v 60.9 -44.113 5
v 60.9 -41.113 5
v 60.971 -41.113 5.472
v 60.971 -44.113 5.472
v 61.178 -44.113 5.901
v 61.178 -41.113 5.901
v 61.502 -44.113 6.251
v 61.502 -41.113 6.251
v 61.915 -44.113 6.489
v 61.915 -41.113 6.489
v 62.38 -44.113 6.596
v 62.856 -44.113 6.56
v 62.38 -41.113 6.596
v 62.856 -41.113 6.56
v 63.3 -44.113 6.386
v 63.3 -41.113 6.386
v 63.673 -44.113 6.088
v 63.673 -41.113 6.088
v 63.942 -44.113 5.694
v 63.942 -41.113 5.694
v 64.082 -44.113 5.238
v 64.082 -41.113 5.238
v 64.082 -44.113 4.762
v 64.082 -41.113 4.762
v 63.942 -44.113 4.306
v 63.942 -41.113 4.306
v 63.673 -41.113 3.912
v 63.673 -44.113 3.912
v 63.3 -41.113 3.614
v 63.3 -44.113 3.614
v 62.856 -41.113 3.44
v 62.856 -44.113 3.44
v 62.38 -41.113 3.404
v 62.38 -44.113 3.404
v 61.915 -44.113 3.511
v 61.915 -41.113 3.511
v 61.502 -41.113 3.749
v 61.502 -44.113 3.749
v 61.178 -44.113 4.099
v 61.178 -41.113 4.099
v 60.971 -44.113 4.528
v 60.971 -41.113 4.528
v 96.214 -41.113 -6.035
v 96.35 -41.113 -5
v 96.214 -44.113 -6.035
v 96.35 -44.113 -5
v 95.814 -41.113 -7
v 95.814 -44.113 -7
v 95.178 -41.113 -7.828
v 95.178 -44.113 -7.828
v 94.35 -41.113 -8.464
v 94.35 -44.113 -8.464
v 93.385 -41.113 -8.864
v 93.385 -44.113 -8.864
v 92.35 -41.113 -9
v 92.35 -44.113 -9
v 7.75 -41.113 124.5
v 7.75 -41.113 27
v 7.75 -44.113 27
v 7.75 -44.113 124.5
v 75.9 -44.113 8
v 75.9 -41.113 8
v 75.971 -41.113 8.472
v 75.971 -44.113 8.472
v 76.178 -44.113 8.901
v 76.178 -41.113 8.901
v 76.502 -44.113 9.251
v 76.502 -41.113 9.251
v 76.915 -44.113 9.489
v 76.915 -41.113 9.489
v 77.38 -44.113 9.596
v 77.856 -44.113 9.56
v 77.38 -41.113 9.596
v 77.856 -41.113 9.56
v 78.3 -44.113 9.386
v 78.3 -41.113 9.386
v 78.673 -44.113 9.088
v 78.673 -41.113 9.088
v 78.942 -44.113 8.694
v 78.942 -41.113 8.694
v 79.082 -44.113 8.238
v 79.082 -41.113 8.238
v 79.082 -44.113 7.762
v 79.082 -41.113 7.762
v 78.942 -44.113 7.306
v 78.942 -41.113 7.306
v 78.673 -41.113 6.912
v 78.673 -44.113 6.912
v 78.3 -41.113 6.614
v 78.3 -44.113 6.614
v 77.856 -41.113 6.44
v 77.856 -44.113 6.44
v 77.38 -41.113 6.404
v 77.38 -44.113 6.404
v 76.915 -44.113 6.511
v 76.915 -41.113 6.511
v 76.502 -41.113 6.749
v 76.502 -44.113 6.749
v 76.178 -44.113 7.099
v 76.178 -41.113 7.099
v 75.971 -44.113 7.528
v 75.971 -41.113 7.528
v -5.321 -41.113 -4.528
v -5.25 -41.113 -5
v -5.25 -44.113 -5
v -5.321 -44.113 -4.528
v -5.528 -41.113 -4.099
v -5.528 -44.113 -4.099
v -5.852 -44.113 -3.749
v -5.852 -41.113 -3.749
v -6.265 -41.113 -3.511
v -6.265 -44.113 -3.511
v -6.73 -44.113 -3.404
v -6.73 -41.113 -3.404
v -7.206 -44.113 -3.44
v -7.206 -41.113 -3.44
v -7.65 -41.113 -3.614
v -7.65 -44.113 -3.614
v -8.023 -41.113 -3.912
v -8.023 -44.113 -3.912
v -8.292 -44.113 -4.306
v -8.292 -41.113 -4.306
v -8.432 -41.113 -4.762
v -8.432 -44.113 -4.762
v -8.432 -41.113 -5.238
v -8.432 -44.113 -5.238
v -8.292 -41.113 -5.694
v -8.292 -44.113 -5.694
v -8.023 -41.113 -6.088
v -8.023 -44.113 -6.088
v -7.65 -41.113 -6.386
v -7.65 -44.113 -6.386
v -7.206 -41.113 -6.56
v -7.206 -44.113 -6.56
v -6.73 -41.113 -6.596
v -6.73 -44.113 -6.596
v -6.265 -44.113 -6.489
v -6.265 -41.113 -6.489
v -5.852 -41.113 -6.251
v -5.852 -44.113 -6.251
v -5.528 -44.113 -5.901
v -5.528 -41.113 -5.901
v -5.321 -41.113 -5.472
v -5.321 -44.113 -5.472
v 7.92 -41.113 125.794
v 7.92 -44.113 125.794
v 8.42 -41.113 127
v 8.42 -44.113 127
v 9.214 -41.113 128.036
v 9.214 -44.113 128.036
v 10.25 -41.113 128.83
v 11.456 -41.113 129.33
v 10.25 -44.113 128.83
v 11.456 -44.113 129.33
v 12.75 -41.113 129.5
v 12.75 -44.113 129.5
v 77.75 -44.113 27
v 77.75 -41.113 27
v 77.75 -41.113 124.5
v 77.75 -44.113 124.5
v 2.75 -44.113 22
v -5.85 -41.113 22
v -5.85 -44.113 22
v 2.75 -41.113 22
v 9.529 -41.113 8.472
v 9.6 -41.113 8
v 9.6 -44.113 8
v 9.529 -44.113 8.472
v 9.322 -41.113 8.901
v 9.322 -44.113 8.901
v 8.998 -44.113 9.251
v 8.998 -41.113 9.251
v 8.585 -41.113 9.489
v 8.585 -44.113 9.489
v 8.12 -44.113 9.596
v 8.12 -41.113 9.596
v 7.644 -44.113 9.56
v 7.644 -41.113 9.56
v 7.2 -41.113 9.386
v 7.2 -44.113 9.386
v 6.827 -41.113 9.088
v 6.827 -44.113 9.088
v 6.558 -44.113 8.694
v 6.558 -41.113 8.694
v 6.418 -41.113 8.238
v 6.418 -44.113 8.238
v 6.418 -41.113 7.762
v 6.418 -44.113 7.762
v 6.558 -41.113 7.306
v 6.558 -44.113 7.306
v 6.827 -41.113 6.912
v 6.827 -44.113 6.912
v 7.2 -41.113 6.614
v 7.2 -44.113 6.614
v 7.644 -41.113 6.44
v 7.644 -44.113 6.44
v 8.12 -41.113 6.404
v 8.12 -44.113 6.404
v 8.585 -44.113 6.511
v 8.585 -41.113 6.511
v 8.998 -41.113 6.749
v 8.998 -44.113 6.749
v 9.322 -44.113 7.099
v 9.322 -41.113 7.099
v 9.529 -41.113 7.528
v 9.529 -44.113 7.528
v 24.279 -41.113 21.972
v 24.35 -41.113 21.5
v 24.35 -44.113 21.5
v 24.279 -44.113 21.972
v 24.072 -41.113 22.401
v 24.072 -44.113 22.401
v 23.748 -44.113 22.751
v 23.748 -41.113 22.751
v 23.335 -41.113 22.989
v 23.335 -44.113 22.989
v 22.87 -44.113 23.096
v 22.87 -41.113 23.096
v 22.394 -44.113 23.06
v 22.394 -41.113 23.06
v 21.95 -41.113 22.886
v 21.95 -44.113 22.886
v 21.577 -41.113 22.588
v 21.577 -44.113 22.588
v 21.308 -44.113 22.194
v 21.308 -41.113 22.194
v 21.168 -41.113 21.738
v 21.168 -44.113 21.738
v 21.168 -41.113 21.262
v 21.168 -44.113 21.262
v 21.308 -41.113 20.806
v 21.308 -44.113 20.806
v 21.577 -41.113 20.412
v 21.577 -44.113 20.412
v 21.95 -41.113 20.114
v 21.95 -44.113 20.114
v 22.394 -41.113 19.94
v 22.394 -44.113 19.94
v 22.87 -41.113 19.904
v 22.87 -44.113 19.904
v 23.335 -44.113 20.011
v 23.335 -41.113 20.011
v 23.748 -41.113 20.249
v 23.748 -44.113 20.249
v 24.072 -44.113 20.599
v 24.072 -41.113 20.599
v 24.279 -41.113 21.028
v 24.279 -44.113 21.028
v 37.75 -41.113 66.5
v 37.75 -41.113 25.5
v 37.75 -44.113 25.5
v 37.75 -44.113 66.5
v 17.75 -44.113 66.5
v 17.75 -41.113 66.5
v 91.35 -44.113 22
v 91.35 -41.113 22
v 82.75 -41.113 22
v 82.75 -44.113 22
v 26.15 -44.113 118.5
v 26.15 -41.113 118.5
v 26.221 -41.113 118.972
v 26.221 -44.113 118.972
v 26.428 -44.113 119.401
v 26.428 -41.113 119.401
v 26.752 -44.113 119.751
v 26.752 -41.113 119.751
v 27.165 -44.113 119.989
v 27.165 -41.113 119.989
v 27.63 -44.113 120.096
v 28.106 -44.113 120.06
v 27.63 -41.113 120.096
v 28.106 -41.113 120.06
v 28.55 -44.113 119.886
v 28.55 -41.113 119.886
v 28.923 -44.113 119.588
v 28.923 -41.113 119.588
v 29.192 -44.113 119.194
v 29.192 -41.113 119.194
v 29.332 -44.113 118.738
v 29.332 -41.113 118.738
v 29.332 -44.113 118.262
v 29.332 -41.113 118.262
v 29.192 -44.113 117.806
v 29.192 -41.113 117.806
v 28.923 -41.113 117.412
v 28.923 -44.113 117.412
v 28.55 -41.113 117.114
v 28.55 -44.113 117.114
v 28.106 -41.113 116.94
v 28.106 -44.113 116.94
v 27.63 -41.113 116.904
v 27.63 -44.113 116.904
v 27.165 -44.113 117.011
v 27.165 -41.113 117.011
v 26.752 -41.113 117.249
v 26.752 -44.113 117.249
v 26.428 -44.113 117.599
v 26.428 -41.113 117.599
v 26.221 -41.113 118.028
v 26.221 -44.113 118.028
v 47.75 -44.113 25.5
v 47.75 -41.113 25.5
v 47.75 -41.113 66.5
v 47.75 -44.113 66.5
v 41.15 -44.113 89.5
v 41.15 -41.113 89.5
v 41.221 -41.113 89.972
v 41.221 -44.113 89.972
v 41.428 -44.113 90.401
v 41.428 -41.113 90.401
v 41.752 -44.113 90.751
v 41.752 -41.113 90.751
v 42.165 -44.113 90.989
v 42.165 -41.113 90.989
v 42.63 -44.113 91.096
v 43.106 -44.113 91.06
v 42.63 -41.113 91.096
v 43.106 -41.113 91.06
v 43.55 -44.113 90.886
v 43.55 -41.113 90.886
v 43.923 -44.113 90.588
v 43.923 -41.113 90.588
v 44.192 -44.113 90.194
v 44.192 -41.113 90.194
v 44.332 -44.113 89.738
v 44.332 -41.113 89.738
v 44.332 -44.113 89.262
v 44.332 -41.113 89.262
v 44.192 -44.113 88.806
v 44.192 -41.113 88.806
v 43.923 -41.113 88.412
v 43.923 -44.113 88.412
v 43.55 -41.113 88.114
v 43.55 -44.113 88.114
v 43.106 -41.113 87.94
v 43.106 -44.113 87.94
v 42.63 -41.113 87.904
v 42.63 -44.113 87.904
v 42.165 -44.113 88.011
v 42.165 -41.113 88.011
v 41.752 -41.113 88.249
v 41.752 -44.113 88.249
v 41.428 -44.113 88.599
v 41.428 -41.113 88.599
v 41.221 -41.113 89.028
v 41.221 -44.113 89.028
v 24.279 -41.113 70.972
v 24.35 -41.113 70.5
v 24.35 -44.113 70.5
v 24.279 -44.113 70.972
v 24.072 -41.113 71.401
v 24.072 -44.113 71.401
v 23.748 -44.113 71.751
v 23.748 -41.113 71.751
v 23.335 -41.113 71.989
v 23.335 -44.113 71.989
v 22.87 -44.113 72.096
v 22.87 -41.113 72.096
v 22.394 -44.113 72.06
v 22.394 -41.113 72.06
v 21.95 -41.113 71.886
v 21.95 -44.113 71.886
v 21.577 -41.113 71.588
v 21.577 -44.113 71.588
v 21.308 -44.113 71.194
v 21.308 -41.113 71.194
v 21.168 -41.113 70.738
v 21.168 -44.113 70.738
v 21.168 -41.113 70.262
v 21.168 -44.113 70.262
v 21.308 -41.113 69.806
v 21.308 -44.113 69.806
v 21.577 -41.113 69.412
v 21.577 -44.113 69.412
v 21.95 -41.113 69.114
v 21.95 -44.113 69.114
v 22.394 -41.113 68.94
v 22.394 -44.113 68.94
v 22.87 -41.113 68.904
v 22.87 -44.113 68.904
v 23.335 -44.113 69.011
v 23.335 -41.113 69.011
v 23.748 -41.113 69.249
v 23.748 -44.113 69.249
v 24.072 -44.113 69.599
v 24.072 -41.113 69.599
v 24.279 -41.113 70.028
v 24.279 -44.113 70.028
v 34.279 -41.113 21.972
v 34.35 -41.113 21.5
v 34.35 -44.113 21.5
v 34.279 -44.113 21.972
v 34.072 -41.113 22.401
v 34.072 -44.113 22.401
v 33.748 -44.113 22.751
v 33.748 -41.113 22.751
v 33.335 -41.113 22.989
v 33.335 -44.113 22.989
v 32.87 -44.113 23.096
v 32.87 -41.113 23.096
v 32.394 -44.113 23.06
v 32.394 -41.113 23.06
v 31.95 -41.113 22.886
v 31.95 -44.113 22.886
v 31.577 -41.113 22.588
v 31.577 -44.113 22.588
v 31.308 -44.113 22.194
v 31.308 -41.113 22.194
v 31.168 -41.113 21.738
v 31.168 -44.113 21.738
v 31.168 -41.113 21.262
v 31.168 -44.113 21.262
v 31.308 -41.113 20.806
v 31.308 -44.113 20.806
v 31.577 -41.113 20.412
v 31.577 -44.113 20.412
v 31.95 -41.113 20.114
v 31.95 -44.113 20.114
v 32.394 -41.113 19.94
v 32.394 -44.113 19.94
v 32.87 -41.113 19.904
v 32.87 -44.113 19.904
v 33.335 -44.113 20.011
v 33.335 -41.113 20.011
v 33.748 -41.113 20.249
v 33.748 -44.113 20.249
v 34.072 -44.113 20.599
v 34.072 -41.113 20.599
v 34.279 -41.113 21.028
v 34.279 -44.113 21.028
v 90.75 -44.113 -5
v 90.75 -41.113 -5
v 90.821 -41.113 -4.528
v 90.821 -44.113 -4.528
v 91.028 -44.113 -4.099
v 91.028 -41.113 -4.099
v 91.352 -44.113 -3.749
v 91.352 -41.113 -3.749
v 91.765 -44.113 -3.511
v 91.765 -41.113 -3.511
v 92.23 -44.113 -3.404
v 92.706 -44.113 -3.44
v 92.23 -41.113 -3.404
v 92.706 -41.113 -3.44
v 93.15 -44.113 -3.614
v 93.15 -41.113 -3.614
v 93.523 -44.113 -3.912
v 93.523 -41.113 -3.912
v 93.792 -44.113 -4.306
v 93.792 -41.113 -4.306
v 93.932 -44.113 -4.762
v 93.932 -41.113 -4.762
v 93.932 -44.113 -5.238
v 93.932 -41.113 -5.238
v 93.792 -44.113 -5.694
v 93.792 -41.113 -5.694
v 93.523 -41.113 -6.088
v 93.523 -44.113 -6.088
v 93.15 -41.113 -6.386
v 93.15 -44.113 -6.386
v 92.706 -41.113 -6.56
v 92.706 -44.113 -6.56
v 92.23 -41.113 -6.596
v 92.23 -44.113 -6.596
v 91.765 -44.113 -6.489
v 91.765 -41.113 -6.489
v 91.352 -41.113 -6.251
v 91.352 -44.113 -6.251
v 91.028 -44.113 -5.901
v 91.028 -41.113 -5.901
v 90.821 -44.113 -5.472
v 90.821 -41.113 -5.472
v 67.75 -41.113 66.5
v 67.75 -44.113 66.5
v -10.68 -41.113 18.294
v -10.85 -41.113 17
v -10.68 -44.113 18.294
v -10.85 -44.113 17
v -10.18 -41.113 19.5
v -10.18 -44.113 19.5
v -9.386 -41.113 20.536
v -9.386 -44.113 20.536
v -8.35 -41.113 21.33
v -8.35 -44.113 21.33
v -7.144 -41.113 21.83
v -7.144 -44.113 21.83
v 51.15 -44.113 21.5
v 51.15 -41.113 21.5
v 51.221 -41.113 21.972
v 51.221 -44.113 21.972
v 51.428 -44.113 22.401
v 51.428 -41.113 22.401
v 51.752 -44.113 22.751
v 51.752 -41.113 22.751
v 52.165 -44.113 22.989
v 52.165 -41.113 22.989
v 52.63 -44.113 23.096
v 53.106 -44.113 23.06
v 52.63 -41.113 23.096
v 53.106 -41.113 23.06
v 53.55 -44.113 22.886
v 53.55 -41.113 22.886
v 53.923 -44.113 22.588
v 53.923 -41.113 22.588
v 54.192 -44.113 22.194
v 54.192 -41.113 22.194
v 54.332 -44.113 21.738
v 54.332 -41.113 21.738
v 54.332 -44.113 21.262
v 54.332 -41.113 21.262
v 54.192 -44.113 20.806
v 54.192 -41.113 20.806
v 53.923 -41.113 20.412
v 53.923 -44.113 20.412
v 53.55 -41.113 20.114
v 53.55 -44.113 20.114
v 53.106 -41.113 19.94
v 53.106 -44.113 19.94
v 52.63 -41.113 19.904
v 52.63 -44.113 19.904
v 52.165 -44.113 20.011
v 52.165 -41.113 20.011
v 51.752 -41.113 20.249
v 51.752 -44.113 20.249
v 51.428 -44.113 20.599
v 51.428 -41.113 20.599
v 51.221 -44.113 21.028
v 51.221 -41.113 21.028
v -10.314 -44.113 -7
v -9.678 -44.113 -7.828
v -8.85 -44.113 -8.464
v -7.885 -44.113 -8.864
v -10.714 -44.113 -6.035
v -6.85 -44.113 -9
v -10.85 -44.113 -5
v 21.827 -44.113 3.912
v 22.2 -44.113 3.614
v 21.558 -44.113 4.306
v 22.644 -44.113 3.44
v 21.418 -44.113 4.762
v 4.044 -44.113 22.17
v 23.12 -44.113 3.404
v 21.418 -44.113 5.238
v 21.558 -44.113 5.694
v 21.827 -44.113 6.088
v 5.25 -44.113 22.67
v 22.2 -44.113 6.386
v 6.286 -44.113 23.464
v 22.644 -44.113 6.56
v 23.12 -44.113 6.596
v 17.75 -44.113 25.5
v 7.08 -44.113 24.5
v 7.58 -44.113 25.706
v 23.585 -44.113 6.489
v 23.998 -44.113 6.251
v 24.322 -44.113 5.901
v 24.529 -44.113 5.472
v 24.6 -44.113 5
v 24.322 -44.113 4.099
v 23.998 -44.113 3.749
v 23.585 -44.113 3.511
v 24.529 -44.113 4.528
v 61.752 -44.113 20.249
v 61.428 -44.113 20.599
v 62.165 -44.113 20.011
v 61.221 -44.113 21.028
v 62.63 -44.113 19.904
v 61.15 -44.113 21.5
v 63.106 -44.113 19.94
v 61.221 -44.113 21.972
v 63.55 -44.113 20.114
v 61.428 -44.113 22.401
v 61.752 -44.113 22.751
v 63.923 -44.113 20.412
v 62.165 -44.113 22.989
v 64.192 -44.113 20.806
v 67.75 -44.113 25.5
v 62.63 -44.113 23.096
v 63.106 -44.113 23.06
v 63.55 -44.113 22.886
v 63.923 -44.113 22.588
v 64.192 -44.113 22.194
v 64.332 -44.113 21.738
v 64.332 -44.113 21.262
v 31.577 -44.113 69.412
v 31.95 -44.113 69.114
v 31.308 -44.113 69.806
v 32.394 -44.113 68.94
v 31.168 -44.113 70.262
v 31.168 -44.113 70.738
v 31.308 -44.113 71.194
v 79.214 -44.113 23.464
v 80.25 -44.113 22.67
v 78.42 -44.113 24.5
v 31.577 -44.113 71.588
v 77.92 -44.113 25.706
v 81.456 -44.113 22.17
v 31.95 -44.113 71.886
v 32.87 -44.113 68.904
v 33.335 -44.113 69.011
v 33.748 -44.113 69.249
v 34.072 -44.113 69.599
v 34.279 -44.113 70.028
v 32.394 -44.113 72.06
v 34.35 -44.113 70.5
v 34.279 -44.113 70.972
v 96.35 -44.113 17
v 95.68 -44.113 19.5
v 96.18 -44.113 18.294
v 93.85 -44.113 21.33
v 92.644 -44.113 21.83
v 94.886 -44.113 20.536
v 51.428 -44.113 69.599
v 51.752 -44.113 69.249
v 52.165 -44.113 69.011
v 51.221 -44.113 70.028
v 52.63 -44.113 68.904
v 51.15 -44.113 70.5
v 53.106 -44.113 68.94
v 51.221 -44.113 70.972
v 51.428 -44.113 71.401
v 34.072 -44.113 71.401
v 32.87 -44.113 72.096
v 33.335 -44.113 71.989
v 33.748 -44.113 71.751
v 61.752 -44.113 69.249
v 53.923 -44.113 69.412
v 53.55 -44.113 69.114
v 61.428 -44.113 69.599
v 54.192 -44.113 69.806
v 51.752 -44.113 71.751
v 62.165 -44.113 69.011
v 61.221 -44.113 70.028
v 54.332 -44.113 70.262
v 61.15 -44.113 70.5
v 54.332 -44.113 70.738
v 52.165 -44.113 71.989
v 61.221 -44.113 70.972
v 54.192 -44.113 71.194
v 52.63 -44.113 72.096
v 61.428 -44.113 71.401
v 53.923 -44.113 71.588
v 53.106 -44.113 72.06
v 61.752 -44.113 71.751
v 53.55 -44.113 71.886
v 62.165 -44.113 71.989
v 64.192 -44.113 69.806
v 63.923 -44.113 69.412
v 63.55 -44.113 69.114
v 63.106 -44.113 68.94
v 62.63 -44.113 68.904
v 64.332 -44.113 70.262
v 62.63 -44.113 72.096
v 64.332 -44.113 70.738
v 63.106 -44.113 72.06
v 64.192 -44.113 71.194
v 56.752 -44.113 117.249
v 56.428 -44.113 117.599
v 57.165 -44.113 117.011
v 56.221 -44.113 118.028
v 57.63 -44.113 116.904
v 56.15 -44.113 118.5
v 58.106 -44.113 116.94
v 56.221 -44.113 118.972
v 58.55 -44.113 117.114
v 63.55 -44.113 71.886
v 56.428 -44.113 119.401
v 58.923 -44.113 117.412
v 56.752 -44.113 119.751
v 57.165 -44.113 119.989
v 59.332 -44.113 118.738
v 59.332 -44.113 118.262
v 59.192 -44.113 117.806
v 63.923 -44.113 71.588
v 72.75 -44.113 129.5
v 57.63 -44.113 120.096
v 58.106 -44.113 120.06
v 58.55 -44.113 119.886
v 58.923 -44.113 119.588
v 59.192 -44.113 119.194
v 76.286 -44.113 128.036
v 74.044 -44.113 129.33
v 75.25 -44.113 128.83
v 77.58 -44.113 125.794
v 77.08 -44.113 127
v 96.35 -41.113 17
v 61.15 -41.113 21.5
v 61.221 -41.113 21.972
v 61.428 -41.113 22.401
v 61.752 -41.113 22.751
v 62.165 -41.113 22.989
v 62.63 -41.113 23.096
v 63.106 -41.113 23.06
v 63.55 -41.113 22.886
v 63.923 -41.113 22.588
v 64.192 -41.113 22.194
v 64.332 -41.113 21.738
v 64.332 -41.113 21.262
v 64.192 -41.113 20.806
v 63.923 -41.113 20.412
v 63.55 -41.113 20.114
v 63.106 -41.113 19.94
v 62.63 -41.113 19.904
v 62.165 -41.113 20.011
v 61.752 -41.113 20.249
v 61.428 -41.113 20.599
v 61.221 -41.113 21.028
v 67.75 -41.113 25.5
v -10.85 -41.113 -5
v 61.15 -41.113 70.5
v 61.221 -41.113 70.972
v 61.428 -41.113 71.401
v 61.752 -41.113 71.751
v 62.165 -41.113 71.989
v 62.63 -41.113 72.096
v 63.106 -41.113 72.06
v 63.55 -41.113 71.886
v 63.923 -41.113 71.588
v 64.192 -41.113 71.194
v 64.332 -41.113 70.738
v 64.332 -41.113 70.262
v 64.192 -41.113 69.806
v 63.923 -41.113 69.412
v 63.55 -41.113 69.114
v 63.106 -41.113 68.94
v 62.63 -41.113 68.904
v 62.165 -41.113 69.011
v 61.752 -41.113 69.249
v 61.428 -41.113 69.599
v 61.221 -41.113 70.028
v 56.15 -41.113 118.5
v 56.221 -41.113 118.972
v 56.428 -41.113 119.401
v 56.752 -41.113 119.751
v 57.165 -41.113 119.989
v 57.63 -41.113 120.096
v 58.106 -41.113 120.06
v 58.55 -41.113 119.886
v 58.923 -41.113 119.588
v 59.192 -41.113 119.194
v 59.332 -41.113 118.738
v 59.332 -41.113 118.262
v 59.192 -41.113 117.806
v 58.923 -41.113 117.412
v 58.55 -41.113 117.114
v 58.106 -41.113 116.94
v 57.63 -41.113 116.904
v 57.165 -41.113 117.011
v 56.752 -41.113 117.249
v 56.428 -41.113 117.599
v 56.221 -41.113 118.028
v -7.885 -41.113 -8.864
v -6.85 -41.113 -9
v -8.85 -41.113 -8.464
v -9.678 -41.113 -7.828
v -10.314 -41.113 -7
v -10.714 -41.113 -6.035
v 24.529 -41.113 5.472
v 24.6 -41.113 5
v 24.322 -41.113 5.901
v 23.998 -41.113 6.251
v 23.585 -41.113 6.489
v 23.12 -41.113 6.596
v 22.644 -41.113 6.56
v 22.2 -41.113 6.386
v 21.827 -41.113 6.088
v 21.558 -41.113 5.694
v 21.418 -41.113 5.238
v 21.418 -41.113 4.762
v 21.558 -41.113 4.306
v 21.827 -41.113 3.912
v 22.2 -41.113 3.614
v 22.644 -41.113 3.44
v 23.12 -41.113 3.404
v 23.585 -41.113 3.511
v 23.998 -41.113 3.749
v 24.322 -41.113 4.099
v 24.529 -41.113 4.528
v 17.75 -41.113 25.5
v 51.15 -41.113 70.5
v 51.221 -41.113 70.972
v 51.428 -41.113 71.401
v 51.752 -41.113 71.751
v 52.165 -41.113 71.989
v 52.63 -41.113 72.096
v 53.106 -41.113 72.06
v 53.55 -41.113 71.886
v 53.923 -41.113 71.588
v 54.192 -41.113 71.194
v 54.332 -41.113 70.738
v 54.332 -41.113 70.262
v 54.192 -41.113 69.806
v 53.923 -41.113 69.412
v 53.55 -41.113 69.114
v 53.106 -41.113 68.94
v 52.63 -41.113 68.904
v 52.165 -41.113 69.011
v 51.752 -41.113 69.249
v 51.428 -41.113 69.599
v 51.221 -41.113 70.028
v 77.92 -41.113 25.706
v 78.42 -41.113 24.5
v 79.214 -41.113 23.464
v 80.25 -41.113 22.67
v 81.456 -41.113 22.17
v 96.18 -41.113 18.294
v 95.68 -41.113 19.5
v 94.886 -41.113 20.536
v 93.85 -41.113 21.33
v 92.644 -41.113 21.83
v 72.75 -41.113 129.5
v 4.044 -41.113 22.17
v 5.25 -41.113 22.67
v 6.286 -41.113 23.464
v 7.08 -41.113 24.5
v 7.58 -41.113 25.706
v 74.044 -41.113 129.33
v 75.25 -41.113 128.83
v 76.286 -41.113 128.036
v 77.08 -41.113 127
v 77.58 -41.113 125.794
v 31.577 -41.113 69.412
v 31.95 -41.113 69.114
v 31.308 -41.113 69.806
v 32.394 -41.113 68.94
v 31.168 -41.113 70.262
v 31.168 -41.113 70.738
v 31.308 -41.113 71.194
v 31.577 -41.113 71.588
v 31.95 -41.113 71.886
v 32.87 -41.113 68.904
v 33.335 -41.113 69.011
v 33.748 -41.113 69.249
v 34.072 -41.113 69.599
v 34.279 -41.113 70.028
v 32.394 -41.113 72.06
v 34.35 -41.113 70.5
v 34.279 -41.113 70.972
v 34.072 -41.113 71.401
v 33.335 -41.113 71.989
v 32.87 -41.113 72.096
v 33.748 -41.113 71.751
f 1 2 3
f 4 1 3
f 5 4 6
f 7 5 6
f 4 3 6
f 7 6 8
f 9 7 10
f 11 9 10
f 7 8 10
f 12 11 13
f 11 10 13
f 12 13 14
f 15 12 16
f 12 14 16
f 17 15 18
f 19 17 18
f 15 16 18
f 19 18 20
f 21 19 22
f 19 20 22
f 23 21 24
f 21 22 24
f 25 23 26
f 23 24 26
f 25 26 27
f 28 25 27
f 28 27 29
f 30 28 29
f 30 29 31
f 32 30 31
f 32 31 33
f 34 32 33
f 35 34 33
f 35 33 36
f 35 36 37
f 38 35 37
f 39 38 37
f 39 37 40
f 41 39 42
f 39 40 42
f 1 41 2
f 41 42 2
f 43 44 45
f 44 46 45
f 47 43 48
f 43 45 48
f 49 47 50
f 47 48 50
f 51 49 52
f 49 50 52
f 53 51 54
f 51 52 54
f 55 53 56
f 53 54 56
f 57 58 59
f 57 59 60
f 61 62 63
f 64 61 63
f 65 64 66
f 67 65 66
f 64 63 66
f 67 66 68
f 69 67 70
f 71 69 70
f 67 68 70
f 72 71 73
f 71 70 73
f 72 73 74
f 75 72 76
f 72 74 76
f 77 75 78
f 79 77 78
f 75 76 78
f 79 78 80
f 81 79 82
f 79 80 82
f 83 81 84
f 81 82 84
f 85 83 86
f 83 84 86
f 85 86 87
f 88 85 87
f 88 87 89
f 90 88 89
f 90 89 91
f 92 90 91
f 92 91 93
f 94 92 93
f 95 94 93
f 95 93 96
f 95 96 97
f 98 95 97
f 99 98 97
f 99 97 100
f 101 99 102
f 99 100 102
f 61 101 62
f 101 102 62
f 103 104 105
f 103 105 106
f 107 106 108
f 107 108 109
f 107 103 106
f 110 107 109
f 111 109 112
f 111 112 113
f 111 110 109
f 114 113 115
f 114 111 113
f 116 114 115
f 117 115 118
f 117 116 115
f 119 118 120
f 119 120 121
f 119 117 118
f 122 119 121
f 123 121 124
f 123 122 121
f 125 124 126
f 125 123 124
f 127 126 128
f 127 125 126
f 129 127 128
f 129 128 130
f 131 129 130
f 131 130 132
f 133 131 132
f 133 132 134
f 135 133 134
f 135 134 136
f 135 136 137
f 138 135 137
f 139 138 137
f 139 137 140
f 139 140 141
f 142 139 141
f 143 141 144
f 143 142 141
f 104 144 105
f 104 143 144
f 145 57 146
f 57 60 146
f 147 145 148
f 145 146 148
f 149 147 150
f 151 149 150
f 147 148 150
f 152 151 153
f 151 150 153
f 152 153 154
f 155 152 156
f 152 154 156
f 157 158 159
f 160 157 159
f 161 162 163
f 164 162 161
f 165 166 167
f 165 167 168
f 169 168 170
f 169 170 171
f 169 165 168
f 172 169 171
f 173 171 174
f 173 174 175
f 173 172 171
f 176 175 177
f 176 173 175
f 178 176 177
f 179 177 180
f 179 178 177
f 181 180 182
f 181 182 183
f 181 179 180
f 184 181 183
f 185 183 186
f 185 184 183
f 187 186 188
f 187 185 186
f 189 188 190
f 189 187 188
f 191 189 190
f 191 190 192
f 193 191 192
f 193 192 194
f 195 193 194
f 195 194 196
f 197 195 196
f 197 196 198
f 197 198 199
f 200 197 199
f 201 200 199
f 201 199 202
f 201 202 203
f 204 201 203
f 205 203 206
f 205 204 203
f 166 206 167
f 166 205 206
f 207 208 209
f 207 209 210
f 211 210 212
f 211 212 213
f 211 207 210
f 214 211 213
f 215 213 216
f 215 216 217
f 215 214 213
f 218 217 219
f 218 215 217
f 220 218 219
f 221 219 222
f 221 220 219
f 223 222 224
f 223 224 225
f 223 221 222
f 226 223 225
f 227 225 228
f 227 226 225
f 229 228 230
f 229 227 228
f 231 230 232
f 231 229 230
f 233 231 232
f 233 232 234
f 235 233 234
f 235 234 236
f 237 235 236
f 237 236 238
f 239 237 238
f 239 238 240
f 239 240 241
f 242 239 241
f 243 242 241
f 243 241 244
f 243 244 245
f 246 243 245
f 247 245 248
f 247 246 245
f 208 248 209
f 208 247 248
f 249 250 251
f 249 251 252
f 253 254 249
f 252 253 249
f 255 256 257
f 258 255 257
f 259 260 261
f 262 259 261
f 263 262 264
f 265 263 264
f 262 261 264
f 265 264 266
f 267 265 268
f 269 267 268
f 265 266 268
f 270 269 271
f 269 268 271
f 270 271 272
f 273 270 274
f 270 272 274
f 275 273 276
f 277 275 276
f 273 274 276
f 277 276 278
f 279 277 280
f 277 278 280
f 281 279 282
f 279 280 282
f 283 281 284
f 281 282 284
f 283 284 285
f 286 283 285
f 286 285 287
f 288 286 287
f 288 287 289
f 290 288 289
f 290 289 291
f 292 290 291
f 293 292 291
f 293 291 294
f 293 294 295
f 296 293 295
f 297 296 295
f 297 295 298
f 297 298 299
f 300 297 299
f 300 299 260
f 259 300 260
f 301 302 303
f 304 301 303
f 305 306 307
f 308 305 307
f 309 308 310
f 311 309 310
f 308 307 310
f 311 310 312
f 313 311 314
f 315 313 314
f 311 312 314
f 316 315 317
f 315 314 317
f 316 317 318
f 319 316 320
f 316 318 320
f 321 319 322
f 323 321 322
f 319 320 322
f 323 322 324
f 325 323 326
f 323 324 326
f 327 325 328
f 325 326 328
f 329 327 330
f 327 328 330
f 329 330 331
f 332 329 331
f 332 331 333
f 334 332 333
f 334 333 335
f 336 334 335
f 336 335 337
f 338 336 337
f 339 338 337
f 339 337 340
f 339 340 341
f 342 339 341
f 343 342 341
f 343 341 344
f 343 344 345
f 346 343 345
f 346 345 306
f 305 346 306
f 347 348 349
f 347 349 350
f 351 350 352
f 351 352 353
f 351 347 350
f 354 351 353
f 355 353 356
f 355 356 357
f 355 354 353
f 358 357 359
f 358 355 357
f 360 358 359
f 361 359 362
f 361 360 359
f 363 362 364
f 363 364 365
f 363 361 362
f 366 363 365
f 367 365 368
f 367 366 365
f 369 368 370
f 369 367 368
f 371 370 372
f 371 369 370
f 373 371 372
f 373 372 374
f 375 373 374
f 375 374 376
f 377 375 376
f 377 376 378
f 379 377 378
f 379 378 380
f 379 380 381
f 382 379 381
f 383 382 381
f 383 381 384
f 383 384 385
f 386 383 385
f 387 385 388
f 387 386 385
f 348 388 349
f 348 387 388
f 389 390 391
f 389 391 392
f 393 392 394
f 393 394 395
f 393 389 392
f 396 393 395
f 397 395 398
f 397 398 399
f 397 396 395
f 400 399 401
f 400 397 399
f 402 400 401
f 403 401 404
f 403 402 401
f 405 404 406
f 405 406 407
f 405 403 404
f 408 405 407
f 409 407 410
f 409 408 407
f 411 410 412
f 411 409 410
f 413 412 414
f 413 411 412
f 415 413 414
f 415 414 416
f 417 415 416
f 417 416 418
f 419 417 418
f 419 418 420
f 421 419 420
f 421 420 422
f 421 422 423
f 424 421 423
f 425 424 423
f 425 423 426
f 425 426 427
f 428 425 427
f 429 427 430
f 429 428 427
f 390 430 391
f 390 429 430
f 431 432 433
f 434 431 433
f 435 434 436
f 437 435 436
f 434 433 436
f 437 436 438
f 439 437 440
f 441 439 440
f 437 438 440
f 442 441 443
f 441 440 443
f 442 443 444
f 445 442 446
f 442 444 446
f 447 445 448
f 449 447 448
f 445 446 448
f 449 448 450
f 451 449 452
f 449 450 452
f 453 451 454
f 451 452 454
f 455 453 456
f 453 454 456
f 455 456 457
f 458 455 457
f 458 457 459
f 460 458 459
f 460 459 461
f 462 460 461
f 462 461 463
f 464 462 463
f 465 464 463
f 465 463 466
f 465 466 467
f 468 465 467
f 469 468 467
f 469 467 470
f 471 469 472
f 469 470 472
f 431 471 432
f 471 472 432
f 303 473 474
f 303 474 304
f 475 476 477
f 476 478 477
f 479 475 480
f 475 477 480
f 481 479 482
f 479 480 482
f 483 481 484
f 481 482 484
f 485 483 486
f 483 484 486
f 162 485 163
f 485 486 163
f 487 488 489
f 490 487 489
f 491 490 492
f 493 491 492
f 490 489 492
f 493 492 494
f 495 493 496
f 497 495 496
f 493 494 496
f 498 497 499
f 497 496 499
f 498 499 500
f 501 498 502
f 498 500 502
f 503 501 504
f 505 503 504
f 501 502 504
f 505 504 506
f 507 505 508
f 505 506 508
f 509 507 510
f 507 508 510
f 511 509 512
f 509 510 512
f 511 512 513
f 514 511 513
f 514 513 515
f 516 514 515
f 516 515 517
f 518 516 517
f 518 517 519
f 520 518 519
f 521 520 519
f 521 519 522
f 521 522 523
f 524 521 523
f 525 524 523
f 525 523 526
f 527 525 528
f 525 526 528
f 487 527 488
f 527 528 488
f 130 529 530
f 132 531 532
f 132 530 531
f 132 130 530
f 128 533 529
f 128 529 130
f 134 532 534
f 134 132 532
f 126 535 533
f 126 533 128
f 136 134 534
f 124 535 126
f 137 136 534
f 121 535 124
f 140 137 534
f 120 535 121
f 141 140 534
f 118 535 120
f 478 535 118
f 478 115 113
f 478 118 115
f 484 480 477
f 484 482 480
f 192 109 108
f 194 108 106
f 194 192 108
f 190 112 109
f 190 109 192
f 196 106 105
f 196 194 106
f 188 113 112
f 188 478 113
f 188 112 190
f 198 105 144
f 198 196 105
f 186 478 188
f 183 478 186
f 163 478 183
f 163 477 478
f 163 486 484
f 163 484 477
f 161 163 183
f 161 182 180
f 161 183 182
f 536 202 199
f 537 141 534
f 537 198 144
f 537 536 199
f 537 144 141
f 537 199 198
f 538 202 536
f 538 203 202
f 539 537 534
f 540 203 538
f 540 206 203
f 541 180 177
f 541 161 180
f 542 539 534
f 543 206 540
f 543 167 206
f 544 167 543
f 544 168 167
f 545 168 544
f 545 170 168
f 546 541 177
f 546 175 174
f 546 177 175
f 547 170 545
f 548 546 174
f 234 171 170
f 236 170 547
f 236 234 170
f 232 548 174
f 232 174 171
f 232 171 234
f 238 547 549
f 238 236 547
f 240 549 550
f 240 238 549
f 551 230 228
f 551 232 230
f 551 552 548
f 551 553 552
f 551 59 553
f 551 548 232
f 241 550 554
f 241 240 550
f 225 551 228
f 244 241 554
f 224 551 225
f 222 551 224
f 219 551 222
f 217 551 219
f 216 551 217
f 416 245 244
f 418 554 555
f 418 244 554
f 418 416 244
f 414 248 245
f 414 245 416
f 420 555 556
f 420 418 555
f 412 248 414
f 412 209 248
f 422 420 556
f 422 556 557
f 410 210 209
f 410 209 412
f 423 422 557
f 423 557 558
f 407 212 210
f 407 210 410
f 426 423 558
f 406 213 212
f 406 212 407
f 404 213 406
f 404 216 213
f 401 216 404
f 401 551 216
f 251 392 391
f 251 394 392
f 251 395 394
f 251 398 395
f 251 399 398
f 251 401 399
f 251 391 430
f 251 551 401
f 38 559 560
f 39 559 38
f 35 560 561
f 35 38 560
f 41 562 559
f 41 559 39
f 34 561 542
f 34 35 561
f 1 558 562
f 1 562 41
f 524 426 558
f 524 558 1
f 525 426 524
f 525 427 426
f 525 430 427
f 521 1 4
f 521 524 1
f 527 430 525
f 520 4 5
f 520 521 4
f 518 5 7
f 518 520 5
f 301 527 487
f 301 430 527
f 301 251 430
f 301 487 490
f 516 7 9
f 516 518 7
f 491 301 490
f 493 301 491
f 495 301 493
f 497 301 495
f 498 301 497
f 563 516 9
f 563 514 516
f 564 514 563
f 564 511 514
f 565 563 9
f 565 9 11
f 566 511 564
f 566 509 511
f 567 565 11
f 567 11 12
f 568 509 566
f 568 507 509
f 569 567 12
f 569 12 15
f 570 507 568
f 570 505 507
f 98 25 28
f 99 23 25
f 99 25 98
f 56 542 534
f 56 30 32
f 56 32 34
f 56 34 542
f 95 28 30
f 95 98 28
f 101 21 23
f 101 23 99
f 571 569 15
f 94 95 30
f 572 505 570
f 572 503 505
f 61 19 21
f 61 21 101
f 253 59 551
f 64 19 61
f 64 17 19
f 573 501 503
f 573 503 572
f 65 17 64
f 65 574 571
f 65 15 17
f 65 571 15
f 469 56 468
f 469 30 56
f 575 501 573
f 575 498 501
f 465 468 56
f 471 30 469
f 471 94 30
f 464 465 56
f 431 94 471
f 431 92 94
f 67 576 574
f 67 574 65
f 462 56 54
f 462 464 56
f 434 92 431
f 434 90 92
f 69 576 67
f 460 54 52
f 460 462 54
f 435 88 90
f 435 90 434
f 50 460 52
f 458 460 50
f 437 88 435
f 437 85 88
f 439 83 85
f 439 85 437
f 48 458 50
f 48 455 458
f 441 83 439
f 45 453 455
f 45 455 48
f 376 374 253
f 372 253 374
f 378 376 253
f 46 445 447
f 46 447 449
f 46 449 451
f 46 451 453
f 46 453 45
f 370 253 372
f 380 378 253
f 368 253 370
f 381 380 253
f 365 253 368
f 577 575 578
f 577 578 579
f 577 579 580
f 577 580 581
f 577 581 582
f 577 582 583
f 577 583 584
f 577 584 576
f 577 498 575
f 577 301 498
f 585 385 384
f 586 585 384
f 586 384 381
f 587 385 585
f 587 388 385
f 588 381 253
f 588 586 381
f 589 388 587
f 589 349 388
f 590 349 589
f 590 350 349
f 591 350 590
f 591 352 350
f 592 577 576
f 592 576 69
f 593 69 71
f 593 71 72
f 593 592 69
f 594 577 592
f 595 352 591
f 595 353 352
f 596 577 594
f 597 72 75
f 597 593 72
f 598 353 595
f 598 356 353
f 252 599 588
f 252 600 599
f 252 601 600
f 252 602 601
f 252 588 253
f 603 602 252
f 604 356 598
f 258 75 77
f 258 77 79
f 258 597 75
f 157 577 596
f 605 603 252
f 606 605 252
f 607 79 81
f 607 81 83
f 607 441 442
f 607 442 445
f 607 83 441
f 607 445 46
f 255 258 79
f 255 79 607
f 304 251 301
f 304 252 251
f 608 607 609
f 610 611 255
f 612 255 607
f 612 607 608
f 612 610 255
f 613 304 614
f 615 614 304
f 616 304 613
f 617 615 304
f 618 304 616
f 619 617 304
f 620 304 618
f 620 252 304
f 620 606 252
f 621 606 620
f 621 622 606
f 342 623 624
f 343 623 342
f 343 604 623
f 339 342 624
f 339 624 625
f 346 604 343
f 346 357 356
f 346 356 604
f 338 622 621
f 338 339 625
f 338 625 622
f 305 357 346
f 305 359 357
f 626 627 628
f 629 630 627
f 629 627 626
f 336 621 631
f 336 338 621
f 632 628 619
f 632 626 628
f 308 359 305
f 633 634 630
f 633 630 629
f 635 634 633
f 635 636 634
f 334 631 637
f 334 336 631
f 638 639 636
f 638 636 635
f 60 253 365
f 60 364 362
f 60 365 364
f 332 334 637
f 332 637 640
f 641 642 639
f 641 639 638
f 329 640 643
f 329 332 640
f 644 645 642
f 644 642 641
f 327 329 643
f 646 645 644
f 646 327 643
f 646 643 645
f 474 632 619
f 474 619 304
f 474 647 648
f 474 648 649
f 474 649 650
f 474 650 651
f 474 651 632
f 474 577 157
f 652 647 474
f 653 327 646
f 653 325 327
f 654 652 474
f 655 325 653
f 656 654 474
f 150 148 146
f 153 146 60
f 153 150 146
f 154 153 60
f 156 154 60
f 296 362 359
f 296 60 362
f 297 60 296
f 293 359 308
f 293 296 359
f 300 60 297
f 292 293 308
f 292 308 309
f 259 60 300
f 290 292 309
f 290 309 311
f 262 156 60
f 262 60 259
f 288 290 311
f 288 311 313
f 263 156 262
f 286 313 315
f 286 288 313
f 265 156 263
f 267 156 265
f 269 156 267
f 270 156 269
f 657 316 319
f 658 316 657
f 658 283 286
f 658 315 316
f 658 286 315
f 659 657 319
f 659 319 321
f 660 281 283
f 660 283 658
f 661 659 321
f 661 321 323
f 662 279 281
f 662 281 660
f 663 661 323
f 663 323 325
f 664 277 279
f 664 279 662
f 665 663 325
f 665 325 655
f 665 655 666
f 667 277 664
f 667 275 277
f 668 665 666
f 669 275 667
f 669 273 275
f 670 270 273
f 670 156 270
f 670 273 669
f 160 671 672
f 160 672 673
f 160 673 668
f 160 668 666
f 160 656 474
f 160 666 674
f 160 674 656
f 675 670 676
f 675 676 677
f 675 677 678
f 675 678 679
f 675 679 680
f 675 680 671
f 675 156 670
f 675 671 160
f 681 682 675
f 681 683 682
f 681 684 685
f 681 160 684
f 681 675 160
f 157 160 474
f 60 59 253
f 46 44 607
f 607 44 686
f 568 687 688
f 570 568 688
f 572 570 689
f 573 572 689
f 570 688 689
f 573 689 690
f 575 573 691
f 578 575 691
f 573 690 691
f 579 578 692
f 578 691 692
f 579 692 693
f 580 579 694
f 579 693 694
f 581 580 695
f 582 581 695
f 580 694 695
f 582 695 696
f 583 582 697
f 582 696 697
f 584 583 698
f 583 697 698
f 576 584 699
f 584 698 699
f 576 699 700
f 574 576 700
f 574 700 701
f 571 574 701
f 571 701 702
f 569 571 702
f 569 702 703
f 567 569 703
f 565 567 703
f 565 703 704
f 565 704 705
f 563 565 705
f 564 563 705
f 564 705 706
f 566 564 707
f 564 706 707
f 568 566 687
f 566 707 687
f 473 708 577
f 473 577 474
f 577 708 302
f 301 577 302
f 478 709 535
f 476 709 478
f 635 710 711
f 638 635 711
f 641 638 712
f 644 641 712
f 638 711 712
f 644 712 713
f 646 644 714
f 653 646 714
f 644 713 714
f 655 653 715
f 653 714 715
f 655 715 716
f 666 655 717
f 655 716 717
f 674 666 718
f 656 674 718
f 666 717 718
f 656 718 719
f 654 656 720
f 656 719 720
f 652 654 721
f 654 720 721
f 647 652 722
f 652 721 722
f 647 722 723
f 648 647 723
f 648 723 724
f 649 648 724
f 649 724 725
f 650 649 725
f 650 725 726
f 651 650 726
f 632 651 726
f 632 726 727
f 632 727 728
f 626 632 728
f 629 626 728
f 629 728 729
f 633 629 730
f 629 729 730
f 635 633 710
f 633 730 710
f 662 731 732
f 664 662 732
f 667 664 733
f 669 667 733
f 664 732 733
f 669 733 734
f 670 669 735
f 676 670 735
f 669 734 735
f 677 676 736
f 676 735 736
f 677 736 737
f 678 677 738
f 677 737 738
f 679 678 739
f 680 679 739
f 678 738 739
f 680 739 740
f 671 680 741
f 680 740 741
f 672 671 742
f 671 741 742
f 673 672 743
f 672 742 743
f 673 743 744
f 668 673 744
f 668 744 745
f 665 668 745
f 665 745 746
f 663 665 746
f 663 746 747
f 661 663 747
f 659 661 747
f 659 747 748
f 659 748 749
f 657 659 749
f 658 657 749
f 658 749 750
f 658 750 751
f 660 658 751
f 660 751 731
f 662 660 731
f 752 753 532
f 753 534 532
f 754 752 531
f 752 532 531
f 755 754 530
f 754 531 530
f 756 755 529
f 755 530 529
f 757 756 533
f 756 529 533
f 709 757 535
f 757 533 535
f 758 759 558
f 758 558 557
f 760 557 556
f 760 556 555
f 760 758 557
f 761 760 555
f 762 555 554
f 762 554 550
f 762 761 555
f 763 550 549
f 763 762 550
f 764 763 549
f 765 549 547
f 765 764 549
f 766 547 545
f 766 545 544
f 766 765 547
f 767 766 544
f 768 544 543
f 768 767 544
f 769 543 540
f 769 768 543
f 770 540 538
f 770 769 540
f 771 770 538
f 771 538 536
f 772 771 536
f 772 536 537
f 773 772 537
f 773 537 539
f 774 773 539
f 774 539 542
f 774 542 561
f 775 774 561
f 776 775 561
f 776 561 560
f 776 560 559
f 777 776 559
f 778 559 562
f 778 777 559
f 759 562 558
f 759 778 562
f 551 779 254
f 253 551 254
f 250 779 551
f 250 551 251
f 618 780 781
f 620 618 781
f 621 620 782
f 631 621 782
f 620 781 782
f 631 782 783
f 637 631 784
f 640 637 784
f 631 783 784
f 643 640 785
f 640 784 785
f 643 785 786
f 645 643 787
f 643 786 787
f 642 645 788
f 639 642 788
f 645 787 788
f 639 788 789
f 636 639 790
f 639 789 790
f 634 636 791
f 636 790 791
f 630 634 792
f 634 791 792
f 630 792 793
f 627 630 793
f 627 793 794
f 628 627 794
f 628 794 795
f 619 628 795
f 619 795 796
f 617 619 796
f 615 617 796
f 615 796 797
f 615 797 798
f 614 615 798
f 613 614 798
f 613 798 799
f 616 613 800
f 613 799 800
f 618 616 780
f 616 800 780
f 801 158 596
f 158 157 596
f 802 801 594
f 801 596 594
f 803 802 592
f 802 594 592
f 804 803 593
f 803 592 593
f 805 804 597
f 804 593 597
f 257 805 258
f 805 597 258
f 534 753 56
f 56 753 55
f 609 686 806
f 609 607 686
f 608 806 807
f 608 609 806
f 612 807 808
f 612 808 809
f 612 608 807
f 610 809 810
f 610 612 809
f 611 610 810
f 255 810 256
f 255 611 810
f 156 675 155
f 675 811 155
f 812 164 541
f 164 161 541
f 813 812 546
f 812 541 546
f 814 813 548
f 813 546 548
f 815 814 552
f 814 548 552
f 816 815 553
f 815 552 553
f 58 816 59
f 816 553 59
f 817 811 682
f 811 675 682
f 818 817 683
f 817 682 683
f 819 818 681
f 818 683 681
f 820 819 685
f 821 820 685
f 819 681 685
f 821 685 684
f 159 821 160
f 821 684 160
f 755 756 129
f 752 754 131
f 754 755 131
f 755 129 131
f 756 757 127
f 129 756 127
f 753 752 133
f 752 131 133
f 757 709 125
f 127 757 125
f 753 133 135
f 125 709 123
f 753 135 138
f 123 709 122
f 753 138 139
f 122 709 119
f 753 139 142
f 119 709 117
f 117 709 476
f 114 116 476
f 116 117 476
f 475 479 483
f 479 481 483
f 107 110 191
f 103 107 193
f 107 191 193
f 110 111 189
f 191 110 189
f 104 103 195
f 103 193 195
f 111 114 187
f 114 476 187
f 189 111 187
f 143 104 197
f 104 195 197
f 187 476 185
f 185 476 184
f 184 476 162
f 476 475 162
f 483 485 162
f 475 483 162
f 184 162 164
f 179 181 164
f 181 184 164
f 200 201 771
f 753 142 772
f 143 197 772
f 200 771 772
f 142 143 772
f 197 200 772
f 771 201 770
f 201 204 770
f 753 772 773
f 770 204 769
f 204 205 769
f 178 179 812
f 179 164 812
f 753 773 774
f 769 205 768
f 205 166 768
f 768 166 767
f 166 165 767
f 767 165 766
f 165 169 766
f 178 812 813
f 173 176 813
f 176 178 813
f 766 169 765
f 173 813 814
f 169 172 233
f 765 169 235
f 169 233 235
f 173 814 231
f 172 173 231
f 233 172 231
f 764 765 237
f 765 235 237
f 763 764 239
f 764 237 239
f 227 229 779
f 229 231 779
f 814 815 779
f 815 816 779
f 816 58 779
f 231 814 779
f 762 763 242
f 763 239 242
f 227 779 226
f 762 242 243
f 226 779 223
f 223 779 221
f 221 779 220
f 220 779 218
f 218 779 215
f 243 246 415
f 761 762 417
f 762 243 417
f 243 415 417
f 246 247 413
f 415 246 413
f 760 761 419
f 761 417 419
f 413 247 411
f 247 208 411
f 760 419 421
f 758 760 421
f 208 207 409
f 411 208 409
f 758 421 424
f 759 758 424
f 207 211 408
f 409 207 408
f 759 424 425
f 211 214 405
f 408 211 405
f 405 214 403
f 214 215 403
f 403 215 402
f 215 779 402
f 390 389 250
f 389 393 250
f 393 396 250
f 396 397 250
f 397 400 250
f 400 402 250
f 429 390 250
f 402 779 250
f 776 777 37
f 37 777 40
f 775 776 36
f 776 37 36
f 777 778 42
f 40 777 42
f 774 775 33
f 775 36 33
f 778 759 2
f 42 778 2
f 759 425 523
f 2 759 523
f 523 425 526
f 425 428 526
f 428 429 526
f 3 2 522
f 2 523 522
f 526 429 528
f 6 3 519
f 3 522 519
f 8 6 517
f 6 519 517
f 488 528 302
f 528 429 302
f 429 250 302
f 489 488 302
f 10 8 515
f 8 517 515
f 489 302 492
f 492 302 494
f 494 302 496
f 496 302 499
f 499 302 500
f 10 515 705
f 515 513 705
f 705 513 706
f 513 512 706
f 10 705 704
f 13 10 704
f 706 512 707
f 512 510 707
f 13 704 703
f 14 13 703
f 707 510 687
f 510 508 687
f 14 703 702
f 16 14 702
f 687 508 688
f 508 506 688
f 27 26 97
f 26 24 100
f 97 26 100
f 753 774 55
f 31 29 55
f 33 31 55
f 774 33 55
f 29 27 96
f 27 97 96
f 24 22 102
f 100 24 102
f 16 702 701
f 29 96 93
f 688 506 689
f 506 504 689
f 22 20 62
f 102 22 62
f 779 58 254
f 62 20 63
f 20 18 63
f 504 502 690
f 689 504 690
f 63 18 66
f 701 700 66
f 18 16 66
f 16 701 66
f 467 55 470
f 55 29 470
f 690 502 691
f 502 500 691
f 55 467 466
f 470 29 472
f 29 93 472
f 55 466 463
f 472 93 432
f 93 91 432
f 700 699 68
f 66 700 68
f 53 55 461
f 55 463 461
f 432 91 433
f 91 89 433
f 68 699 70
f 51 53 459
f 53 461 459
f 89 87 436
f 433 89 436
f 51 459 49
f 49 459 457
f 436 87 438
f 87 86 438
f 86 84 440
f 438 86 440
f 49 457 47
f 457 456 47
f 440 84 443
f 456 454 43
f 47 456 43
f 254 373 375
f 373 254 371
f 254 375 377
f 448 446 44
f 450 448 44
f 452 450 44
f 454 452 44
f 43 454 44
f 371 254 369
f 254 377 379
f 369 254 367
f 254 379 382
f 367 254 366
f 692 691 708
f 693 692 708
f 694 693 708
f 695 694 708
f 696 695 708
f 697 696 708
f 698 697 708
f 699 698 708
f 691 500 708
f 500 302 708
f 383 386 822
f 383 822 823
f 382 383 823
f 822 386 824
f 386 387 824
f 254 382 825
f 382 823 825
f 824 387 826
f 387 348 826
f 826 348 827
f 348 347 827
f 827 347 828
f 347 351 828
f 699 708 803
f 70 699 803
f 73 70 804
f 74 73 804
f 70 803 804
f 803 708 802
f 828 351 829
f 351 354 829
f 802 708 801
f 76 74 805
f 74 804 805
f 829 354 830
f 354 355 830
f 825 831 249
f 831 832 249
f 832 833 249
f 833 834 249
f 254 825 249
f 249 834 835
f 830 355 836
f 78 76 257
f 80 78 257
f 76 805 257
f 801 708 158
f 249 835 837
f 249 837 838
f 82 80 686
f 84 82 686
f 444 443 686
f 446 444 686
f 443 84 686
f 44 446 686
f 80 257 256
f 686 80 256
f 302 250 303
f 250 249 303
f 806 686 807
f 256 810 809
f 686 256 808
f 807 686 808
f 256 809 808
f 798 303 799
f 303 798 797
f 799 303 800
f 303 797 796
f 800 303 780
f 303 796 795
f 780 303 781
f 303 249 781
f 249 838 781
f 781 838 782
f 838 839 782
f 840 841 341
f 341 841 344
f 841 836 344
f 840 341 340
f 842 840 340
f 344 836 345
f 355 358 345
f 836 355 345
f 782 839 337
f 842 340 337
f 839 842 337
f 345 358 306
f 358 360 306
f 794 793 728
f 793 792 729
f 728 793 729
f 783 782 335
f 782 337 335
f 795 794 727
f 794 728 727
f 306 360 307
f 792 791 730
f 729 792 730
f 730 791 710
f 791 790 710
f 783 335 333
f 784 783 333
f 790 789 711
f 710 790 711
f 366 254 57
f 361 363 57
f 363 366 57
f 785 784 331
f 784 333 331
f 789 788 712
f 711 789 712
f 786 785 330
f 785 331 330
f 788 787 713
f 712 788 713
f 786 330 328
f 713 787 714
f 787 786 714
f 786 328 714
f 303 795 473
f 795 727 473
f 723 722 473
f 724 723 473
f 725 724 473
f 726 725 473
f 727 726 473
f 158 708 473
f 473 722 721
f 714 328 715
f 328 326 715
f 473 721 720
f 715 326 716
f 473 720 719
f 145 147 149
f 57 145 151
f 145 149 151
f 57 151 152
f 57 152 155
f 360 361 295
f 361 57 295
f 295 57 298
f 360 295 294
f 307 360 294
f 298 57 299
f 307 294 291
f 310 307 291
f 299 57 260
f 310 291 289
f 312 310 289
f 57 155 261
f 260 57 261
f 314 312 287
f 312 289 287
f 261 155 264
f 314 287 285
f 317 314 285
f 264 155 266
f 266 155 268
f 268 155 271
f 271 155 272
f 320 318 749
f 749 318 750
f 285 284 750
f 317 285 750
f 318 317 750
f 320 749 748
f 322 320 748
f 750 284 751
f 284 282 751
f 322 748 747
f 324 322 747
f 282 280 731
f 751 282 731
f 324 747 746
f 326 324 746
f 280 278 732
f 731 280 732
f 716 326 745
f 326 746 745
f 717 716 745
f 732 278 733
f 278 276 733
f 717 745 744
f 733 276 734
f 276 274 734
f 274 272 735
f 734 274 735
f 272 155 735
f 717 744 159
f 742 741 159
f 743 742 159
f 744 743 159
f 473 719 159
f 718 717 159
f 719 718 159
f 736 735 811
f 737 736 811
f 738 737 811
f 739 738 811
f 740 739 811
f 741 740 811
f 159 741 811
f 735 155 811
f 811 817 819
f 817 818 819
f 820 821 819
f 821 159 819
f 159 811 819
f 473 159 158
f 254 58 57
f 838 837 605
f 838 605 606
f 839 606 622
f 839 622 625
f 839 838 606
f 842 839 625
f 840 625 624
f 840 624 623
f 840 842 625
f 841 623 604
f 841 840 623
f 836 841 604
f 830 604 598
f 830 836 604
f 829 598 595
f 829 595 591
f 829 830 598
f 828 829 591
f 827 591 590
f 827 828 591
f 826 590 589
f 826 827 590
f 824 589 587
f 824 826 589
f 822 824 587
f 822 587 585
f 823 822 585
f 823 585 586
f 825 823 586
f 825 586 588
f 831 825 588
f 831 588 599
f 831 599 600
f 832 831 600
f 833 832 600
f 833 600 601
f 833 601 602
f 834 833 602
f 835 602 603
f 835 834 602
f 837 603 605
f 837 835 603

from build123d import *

# Parameters (mm, degrees)
SKETCH013_R     = 1.6
SKETCH013_W     = 20
SKETCH013_H     = 41
PAD005_DEPTH    = 3
FILLET009_R     = 4
FILLET010_R     = 5
SKETCH019_R     = 1.6
POCKET011_DEPTH = 3.001


with BuildPart() as part:
    # Sketch013 (on DatumPlane) → Pad005 (new body)
    with BuildSketch(Plane.XZ.offset(41.112698)):
        Polygon((42.75, 129.5), (42.75, -9), (-10.85, -9), (-10.85, 22), (7.75, 22), (7.75, 129.5), align=None)
        with Locations((22.75, 21.5)):
            Circle(SKETCH013_R, mode=Mode.SUBTRACT)
        with Locations((32.75, 21.5)):
            Circle(SKETCH013_R, mode=Mode.SUBTRACT)
        with Locations((8, 8)):
            Circle(SKETCH013_R, mode=Mode.SUBTRACT)
        with Locations((-6.85, -5)):
            Circle(SKETCH013_R, mode=Mode.SUBTRACT)
        with Locations((23, 5)):
            Circle(SKETCH013_R, mode=Mode.SUBTRACT)
        with Locations((22.75, 70.5)):
            Circle(SKETCH013_R, mode=Mode.SUBTRACT)
        with Locations((32.75, 70.5)):
            Circle(SKETCH013_R, mode=Mode.SUBTRACT)
        with Locations((27.75, 46)):
            Rectangle(SKETCH013_W, SKETCH013_H, mode=Mode.SUBTRACT)
    pad005 = extrude(amount=PAD005_DEPTH)

    # Mirrored: Pad005 across face of Pad005
    add(pad005.mirror(Plane(origin=(42.75, -42.612698, 60.25), x_dir=(0, 1, 0), z_dir=(1, 0, 0))))

    # Fillet009
    fillet009_edges = [part.edges().sort_by_distance(p)[0] for p in [
        (96.35, -42.612698, -9),
        (-10.85, -42.612698, -9),
    ]]
    fillet(fillet009_edges, radius=FILLET009_R)

    # Fillet010
    fillet010_edges = [part.edges().sort_by_distance(p)[0] for p in [
        (77.75, -42.612698, 22),
        (96.35, -42.612698, 22),
        (-10.85, -42.612698, 22),
        (7.75, -42.612698, 22),
        (7.75, -42.612698, 129.5),
        (77.75, -42.612698, 129.5),
    ]]
    fillet(fillet010_edges, radius=FILLET010_R)

    # Sketch019 (on Face2 of Fillet010) → Pocket011 (cut, through all)
    with BuildSketch(Plane(origin=(0, -41.112698, 0), x_dir=(-1, 0, 0), z_dir=(0, 1, 0))):
        with Locations((-42.75, 89.5)):
            Circle(SKETCH019_R)
        with Locations((-57.75, 118.5)):
            Circle(SKETCH019_R)
        with Locations((-27.75, 118.5)):
            Circle(SKETCH019_R)
    extrude(amount=-POCKET011_DEPTH, mode=Mode.SUBTRACT)


solid = part.part
